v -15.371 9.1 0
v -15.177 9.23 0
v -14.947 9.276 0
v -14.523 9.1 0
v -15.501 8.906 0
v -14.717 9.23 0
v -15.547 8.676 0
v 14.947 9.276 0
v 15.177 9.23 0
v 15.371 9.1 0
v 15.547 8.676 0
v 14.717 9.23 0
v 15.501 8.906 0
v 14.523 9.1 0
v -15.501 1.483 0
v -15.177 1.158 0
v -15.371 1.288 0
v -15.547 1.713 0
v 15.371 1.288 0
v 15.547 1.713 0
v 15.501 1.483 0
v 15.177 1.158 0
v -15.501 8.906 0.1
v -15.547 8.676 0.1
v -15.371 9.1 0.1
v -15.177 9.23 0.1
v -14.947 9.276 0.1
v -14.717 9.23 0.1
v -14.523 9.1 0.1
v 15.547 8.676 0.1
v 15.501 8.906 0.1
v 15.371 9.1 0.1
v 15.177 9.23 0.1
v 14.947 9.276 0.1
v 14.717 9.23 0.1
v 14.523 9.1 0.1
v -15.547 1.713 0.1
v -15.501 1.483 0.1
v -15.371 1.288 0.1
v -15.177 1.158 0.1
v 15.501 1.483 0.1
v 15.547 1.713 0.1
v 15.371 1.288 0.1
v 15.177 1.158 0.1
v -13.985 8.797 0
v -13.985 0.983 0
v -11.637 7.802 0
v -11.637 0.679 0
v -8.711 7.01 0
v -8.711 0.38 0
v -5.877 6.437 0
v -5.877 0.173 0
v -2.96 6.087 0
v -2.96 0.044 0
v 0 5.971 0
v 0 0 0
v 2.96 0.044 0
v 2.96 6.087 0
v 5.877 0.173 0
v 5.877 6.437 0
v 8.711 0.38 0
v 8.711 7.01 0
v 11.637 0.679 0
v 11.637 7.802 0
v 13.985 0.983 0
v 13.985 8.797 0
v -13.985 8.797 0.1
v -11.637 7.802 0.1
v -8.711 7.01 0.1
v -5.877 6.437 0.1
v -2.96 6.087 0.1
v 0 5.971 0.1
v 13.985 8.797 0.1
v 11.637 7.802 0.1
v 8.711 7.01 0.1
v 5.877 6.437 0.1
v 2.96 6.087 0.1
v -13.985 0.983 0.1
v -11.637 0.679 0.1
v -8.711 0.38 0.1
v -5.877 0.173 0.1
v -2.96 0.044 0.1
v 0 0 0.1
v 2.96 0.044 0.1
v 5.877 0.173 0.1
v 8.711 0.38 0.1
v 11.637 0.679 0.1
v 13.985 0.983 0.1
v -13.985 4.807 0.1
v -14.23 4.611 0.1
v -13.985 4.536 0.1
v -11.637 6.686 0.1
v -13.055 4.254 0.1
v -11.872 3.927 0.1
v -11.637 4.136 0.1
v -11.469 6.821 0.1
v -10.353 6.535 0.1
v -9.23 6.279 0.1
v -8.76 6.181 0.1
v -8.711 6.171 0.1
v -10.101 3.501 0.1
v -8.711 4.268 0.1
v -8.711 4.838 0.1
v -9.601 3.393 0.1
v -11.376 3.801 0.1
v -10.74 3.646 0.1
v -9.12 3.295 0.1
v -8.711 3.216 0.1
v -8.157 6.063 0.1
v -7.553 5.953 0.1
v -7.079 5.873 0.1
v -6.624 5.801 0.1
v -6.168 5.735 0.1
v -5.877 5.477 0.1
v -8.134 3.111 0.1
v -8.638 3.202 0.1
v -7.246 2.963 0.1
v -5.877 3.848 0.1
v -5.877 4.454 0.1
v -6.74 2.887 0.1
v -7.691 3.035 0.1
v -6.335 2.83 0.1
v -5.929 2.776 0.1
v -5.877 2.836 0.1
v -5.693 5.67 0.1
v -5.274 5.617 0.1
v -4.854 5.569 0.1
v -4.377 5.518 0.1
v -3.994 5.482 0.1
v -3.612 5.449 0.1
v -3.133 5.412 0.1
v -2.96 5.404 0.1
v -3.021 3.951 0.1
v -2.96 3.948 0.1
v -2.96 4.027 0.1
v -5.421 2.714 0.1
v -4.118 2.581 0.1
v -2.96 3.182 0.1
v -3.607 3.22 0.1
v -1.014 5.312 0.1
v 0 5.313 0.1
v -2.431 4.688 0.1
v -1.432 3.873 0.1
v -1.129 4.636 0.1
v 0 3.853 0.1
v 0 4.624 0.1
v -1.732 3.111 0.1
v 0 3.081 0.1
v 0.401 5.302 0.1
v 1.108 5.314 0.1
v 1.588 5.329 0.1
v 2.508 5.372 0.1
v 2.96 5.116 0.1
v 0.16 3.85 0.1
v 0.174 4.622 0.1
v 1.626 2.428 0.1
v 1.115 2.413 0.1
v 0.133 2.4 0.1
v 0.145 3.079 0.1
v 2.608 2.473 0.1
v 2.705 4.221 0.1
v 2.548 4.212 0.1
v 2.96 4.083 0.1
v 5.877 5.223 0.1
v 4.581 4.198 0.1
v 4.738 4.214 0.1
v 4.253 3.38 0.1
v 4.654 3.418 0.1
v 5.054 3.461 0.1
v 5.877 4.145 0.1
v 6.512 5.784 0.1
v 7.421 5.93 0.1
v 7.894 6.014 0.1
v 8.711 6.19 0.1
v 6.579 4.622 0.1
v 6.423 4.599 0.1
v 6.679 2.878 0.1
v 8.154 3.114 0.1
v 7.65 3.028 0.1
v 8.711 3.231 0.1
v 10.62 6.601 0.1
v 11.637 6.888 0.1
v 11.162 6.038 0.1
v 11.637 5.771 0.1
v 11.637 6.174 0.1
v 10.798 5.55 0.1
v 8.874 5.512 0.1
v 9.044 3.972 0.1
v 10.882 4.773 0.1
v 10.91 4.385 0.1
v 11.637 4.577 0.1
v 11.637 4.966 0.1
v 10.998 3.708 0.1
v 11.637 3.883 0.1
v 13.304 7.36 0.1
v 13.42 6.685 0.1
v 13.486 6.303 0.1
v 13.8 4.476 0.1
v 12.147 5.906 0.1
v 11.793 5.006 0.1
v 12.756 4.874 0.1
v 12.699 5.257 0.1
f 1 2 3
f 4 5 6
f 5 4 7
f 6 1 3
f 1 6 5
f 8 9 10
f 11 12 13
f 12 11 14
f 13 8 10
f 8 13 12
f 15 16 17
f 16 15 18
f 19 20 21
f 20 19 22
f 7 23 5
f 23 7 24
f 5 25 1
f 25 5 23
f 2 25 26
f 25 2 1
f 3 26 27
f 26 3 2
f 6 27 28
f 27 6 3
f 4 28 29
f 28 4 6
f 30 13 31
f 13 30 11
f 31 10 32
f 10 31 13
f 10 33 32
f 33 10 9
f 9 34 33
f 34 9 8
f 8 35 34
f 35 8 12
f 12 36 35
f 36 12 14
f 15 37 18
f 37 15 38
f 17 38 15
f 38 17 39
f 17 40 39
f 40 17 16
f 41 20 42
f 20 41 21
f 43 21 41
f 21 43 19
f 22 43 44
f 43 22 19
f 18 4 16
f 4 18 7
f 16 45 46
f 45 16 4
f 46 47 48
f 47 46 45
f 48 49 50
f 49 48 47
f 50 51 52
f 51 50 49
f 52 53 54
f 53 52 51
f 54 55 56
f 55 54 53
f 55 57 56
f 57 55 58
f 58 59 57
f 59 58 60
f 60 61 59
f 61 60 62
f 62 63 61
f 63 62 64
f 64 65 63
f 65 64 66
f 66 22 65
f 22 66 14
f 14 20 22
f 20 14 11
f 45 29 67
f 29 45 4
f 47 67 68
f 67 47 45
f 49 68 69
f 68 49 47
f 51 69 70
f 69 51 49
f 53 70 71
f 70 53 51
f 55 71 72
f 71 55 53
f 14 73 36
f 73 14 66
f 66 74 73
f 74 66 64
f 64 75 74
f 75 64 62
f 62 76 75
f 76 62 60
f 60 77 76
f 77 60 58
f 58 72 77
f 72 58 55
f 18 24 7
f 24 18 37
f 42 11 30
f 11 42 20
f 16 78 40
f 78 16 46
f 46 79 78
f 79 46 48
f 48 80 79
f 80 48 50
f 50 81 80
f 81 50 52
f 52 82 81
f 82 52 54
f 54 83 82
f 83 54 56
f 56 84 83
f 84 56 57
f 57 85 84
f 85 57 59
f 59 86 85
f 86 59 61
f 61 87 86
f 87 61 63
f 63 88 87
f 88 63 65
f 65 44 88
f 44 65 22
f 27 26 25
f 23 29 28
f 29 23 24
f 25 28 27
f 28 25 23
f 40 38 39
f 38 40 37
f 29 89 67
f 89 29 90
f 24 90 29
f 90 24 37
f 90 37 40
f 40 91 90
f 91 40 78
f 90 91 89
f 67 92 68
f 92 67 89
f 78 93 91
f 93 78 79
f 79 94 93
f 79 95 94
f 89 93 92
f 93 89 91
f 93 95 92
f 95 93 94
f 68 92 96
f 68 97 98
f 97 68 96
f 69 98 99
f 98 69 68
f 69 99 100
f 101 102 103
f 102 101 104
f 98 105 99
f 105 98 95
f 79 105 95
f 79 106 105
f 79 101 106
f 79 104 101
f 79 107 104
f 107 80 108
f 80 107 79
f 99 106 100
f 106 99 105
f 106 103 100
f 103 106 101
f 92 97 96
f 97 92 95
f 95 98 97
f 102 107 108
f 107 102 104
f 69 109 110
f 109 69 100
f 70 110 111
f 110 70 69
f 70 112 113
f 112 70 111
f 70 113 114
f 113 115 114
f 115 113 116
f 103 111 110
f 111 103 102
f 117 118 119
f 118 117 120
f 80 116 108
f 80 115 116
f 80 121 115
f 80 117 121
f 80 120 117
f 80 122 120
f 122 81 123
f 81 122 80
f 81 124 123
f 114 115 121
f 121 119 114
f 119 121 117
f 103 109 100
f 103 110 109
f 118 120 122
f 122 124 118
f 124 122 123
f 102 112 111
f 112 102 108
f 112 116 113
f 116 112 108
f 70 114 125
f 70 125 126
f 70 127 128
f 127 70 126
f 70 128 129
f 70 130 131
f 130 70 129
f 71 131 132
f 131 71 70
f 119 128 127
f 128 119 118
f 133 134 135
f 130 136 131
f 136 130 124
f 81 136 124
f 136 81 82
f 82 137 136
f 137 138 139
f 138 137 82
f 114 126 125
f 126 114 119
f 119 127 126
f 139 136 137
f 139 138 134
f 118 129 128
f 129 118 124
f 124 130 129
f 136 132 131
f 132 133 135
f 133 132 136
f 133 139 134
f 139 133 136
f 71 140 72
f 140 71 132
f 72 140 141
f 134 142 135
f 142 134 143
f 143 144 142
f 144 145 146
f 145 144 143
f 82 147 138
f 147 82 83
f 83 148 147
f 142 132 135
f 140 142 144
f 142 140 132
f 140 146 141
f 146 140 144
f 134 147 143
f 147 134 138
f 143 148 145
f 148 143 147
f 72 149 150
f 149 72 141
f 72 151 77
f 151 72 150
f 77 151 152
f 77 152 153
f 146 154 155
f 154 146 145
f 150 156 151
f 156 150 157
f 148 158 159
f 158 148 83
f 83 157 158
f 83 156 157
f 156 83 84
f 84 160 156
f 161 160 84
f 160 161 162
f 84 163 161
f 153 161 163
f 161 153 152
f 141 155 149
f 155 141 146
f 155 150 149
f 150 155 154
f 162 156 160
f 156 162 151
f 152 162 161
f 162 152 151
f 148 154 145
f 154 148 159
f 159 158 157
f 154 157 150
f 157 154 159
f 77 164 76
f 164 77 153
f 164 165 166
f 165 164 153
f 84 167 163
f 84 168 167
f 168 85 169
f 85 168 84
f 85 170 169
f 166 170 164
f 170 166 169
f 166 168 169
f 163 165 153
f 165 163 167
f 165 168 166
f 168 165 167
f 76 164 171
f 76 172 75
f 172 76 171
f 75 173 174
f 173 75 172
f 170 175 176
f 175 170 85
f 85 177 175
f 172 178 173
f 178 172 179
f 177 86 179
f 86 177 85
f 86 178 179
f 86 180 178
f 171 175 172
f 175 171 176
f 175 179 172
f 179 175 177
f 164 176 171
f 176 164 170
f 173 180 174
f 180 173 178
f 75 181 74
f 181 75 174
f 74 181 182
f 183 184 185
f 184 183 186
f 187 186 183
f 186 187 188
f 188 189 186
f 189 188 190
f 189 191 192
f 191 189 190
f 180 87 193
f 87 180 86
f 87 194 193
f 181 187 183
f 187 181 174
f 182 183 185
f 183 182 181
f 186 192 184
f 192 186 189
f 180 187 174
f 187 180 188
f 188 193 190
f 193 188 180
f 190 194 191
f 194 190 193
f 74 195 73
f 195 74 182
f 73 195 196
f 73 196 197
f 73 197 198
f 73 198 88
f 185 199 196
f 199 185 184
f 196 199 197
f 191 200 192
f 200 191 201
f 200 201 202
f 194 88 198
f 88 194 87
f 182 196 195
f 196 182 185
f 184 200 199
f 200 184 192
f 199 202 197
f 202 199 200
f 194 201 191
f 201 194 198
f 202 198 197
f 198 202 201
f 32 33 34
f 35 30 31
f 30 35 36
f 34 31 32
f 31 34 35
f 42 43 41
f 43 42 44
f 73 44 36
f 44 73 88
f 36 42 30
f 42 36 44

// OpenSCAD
use <../lib.scad>
use <s/6177741os01.scad>
use <s/6177741os02.scad>
use <s/6177741os03.scad>
use <s/6177741os04.scad>
use <s/6177741os05.scad>
use <s/6177741os06.scad>
use <s/6177741os07.scad>
use <s/6177741os08.scad>
use <s/6177741os09.scad>
use <s/6177741os10.scad>
use <s/6177741os11.scad>
use <s/6177741os12.scad>
use <s/6177741os13.scad>
function ldraw_lib__6177741o() = [
// 0 Sticker  1.2 x  3.9 with White AMG on Black Background
// 0 Name: 6177741o.dat
// 0 Author: Massimo Maso [Sirio]
// 0 !LDRAW_ORG Part UPDATE 2025-05
// 0 !LICENSE Licensed under CC BY 4.0 : see CAreadme.txt
// 
// 0 BFC CERTIFY CCW
  [0,"BFC","CERTIFY"],
  [0,"BFC","CCW"],
// 
// 0 !KEYWORDS BrickLink 75877stk01, GT3, Mercedes, Rebrickable 30844, Set 75877
// 0 !KEYWORDS Speed Champions
// 
// 0 !HISTORY 2025-05-28 [OrionP] Official Update 2025-05
// 
// 1 16 0 0 0 1 0 0 0 1 0 0 0 1 s\6177741os13.dat
  [1,16,0,0,0,1,0,0,0,1,0,0,0,1, ldraw_lib__s__6177741os13()],
// 0 BFC NOCLIP
  [0,"BFC","NOCLIP"],
// 1 16 -34.9686 0 0 1 0 0 0 1 0 0 0 1 s\6177741os01.dat
  [1,16,-34.9686,0,0,1,0,0,0,1,0,0,0,1, ldraw_lib__s__6177741os01()],
// 1 16 -34.9564 0 0 1 0 0 0 1 0 0 0 1 s\6177741os02.dat
  [1,16,-34.9564,0,0,1,0,0,0,1,0,0,0,1, ldraw_lib__s__6177741os02()],
// 1 16 -21.7843 0 0 1 0 0 0 1 0 0 0 1 s\6177741os03.dat
  [1,16,-21.7843,0,0,1,0,0,0,1,0,0,0,1, ldraw_lib__s__6177741os03()],
// 1 16 -21.7719 0 0 1 0 0 0 1 0 0 0 1 s\6177741os04.dat
  [1,16,-21.7719,0,0,1,0,0,0,1,0,0,0,1, ldraw_lib__s__6177741os04()],
// 1 16 -7.4065 0 0 1 0 0 0 1 0 0 0 1 s\6177741os05.dat
  [1,16,-7.4065,0,0,1,0,0,0,1,0,0,0,1, ldraw_lib__s__6177741os05()],
// 1 16 -7.3931 0 0 1 0 0 0 1 0 0 0 1 s\6177741os06.dat
  [1,16,-7.3931,0,0,1,0,0,0,1,0,0,0,1, ldraw_lib__s__6177741os06()],
// 1 16 7.3931 0 0 1 0 0 0 1 0 0 0 1 s\6177741os07.dat
  [1,16,7.3931,0,0,1,0,0,0,1,0,0,0,1, ldraw_lib__s__6177741os07()],
// 1 16 7.4065 0 0 1 0 0 0 1 0 0 0 1 s\6177741os08.dat
  [1,16,7.4065,0,0,1,0,0,0,1,0,0,0,1, ldraw_lib__s__6177741os08()],
// 1 16 21.7719 0 0 1 0 0 0 1 0 0 0 1 s\6177741os09.dat
  [1,16,21.7719,0,0,1,0,0,0,1,0,0,0,1, ldraw_lib__s__6177741os09()],
// 1 16 21.7843 0 0 1 0 0 0 1 0 0 0 1 s\6177741os10.dat
  [1,16,21.7843,0,0,1,0,0,0,1,0,0,0,1, ldraw_lib__s__6177741os10()],
// 1 16 34.9564 0 0 1 0 0 0 1 0 0 0 1 s\6177741os11.dat
  [1,16,34.9564,0,0,1,0,0,0,1,0,0,0,1, ldraw_lib__s__6177741os11()],
// 1 16 34.9686 0 0 1 0 0 0 1 0 0 0 1 s\6177741os12.dat
  [1,16,34.9686,0,0,1,0,0,0,1,0,0,0,1, ldraw_lib__s__6177741os12()],
];
module ldraw_lib__6177741o(step=0, col=false, unit=2/5, alt=false, line=0.2, solid=!$preview)
    makepoly(ldraw_lib__6177741o(), step=step, col=col, unit=unit, alt=alt, line=line, solid=solid);
ldraw_lib__6177741o(line=0.2);
